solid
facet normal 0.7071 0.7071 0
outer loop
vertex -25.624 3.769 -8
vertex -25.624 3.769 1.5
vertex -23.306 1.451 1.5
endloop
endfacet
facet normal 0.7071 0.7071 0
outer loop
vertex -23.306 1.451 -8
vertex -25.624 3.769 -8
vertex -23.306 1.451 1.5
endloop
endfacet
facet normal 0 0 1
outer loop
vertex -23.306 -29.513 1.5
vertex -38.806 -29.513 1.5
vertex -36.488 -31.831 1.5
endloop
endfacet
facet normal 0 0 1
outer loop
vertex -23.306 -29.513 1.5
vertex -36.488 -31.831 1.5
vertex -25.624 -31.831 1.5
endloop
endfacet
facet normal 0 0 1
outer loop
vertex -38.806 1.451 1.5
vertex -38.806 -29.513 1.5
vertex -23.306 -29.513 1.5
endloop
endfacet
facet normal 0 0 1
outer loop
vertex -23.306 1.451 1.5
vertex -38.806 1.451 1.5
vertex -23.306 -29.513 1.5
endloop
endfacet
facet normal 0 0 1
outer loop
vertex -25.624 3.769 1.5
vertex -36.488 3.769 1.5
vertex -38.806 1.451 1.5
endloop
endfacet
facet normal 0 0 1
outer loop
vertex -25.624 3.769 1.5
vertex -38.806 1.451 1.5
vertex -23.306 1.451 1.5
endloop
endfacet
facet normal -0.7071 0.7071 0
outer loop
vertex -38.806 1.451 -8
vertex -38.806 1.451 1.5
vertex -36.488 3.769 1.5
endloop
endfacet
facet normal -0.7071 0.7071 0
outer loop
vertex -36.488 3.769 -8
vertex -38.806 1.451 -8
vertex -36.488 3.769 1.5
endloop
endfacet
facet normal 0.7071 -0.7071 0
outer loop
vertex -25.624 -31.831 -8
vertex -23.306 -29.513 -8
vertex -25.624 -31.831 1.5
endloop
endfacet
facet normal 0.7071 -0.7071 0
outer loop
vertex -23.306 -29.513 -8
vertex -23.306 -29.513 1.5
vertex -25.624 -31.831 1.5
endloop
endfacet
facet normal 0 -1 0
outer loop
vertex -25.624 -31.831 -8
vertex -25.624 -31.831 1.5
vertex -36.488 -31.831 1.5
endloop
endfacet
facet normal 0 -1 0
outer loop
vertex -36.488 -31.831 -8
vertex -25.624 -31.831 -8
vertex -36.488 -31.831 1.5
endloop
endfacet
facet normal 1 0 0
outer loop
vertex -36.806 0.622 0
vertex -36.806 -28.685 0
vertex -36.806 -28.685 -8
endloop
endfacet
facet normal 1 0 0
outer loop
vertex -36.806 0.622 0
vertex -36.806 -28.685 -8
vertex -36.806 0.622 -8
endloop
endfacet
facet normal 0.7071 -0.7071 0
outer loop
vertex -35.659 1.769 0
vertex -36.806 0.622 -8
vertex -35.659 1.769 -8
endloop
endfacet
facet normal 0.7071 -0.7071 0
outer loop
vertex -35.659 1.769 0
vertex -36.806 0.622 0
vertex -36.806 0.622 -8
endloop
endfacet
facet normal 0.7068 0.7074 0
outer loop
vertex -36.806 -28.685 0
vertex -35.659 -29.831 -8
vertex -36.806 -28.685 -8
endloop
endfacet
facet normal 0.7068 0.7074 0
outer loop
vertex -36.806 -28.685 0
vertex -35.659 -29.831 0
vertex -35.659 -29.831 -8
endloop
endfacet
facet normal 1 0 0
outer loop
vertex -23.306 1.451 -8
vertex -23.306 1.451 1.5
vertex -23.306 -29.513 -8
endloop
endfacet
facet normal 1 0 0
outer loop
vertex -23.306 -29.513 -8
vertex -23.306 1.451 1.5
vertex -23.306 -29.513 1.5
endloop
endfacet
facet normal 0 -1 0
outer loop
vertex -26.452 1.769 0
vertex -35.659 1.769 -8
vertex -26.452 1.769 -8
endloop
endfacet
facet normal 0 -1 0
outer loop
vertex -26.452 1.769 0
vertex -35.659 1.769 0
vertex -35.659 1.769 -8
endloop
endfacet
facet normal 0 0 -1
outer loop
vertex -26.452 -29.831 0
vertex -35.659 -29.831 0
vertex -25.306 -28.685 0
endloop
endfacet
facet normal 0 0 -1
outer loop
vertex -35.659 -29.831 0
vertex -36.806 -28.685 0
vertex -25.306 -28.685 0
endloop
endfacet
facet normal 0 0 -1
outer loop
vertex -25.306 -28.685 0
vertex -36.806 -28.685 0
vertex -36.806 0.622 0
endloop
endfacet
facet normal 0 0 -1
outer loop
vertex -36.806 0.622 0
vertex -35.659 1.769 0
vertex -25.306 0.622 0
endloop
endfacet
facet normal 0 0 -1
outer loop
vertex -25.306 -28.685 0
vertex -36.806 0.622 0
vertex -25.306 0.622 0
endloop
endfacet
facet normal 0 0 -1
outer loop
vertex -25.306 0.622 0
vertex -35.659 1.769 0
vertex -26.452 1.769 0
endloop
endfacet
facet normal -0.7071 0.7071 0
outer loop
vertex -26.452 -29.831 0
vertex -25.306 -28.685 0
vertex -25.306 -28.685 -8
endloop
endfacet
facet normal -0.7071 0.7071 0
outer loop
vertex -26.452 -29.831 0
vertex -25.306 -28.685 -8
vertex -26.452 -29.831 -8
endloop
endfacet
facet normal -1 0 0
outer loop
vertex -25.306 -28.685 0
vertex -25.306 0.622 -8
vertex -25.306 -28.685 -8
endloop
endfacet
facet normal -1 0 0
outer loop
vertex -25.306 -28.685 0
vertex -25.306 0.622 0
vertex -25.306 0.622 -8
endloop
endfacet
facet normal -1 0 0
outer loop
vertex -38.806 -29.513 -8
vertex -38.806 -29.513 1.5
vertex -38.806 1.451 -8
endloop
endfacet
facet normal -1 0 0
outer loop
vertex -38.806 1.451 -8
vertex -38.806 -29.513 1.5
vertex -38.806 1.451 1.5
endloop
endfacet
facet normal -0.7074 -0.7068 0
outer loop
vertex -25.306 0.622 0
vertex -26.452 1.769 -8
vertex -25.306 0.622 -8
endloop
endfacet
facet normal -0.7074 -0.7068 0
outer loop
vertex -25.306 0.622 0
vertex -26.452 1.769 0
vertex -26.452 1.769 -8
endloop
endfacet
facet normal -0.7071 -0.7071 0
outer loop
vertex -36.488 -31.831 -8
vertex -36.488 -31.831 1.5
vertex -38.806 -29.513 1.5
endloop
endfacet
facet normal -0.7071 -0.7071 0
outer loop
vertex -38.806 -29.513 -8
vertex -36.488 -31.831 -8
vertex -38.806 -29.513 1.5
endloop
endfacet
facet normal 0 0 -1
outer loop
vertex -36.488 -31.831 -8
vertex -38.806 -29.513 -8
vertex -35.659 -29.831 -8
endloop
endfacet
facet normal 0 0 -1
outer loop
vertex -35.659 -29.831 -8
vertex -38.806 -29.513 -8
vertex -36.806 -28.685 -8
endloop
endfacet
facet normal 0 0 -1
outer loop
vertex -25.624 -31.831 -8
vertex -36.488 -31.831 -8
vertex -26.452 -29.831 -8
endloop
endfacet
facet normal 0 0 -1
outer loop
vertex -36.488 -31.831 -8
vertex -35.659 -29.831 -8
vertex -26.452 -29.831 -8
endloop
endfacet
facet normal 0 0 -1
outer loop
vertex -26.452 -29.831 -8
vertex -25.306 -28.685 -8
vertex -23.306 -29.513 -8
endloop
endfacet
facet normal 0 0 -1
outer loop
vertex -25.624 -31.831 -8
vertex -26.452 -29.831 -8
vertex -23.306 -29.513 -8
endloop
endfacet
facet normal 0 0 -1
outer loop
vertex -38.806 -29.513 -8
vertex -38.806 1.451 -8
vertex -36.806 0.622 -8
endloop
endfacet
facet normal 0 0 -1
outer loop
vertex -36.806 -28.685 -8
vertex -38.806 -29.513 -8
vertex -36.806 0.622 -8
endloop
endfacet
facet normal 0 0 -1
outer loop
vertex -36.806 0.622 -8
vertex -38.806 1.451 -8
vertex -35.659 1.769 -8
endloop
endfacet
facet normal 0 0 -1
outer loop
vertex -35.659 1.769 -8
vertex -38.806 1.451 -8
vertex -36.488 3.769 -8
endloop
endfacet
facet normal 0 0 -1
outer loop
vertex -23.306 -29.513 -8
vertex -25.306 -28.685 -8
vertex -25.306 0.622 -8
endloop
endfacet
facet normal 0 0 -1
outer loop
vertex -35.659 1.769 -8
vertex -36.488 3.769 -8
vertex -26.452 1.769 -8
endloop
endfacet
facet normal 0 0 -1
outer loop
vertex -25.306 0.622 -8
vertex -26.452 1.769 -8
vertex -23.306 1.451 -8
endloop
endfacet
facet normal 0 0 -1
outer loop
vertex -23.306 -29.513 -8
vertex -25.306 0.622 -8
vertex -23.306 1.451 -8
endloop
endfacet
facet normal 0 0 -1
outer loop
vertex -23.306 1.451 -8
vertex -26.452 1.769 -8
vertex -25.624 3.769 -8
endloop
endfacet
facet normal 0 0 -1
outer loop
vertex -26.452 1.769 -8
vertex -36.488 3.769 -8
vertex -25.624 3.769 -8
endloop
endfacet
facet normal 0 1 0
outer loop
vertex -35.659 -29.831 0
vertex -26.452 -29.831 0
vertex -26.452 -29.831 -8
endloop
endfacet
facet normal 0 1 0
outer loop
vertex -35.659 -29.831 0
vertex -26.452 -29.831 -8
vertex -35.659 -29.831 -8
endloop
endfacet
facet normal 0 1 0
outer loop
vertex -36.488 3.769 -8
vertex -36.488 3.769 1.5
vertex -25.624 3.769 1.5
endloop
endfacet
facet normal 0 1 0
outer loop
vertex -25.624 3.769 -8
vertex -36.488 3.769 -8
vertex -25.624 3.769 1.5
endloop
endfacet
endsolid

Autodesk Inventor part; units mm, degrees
ref_plane "YZ Plane" through (0, 0, 0) normal (1, 0, 0) x (0, 1, 0)
ref_plane "XZ Plane" through (0, 0, 0) normal (0, 1, 0) x (-1, 0, 0)
ref_plane "XY Plane" through (0, 0, 0) normal (0, 0, 1) x (1, 0, 0)
sketch "Sketch1" plane through (0, 0, 0) normal (0, 0, 1) x (1, 0, 0)
  line L0 (-35.5556, 1.5189) -> (-26.5556, 1.5189)
  line L1 (-25.5556, 0.5189) -> (-25.5556, -28.5811)
  line L2 (-26.5556, -29.5811) -> (-35.5556, -29.5811)
  line L3 (-36.5556, -28.5811) -> (-36.5556, 0.5189)
  line L4 (-35.5556, 1.5189) -> (-36.5556, 0.5189)
  line L5 (-25.5556, 0.5189) -> (-26.5556, 1.5189)
  line L6 (-25.5556, -28.5811) -> (-26.5556, -29.5811)
  line L7 (-35.5556, -29.5811) -> (-36.5556, -28.5811)
  line L8 (-26.452, 1.7689) -> (-25.3056, 0.6224)
  line L9 (-25.3056, 0.6224) -> (-25.3056, -28.6847)
  line L10 (-25.3056, -28.6847) -> (-26.452, -29.8311)
  line L11 (-26.452, -29.8311) -> (-35.6592, -29.8311)
  line L12 (-35.6592, -29.8311) -> (-36.8056, -28.6847)
  line L13 (-36.8056, -28.6847) -> (-36.8056, 0.6224)
  line L14 (-36.8056, 0.6224) -> (-35.6592, 1.7689)
  line L15 (-35.6592, 1.7689) -> (-26.452, 1.7689)
  line L16 (-25.6236, 3.7689) -> (-23.3056, 1.4508)
  line L17 (-23.3056, 1.4508) -> (-23.3056, -29.5131)
  line L18 (-23.3056, -29.5131) -> (-25.6236, -31.8311)
  line L19 (-25.6236, -31.8311) -> (-36.4876, -31.8311)
  line L20 (-36.4876, -31.8311) -> (-38.8056, -29.5131)
  line L21 (-38.8056, -29.5131) -> (-38.8056, 1.4508)
  line L22 (-38.8056, 1.4508) -> (-36.4876, 3.7689)
  line L23 (-36.4876, 3.7689) -> (-25.6236, 3.7689)
  point P0 (0, 0)
  point P1 (-36.5556, 1.5189)
  point P2 (-25.5556, -29.5811)
  point P3 (-25.5556, 1.5189)
  point P4 (-36.5556, -29.5811)
  dimension "d0" = 31.1
  dimension "d1" = 11
  dimension "d2" = 1
  dimension "d3" = 1
  dimension "d4" = 1
  dimension "d5" = 1
  dimension "d6" = 1
  dimension "d7" = 1
  dimension "d8" = 1
  dimension "d9" = 1
  dimension "d10" = 0.25
  dimension "d11" = 2
extrude "Extrusion1" add sketch "Sketch1" along normal blind 1.5 contours L0 L5 L1 L6 L2 L7 L3 L4 | L8 L9 L10 L11 L12 L13 L14 L15 | L16 L17 L18 L19 L20 L21 L22 L23
extrude "Extrusion2" add sketch "Sketch1" against normal blind 8 contours L16 L17 L18 L19 L20 L21 L22 L23
equation "\"d3\" = d2"
equation "\"d4\" = d2"
equation "\"d5\" = d4"
equation "\"d6\" = d2"
equation "\"d7\" = d6"
equation "\"d8\" = d2"
equation "\"d9\" = d8"
properties part number "CattailShellMockup_01"
